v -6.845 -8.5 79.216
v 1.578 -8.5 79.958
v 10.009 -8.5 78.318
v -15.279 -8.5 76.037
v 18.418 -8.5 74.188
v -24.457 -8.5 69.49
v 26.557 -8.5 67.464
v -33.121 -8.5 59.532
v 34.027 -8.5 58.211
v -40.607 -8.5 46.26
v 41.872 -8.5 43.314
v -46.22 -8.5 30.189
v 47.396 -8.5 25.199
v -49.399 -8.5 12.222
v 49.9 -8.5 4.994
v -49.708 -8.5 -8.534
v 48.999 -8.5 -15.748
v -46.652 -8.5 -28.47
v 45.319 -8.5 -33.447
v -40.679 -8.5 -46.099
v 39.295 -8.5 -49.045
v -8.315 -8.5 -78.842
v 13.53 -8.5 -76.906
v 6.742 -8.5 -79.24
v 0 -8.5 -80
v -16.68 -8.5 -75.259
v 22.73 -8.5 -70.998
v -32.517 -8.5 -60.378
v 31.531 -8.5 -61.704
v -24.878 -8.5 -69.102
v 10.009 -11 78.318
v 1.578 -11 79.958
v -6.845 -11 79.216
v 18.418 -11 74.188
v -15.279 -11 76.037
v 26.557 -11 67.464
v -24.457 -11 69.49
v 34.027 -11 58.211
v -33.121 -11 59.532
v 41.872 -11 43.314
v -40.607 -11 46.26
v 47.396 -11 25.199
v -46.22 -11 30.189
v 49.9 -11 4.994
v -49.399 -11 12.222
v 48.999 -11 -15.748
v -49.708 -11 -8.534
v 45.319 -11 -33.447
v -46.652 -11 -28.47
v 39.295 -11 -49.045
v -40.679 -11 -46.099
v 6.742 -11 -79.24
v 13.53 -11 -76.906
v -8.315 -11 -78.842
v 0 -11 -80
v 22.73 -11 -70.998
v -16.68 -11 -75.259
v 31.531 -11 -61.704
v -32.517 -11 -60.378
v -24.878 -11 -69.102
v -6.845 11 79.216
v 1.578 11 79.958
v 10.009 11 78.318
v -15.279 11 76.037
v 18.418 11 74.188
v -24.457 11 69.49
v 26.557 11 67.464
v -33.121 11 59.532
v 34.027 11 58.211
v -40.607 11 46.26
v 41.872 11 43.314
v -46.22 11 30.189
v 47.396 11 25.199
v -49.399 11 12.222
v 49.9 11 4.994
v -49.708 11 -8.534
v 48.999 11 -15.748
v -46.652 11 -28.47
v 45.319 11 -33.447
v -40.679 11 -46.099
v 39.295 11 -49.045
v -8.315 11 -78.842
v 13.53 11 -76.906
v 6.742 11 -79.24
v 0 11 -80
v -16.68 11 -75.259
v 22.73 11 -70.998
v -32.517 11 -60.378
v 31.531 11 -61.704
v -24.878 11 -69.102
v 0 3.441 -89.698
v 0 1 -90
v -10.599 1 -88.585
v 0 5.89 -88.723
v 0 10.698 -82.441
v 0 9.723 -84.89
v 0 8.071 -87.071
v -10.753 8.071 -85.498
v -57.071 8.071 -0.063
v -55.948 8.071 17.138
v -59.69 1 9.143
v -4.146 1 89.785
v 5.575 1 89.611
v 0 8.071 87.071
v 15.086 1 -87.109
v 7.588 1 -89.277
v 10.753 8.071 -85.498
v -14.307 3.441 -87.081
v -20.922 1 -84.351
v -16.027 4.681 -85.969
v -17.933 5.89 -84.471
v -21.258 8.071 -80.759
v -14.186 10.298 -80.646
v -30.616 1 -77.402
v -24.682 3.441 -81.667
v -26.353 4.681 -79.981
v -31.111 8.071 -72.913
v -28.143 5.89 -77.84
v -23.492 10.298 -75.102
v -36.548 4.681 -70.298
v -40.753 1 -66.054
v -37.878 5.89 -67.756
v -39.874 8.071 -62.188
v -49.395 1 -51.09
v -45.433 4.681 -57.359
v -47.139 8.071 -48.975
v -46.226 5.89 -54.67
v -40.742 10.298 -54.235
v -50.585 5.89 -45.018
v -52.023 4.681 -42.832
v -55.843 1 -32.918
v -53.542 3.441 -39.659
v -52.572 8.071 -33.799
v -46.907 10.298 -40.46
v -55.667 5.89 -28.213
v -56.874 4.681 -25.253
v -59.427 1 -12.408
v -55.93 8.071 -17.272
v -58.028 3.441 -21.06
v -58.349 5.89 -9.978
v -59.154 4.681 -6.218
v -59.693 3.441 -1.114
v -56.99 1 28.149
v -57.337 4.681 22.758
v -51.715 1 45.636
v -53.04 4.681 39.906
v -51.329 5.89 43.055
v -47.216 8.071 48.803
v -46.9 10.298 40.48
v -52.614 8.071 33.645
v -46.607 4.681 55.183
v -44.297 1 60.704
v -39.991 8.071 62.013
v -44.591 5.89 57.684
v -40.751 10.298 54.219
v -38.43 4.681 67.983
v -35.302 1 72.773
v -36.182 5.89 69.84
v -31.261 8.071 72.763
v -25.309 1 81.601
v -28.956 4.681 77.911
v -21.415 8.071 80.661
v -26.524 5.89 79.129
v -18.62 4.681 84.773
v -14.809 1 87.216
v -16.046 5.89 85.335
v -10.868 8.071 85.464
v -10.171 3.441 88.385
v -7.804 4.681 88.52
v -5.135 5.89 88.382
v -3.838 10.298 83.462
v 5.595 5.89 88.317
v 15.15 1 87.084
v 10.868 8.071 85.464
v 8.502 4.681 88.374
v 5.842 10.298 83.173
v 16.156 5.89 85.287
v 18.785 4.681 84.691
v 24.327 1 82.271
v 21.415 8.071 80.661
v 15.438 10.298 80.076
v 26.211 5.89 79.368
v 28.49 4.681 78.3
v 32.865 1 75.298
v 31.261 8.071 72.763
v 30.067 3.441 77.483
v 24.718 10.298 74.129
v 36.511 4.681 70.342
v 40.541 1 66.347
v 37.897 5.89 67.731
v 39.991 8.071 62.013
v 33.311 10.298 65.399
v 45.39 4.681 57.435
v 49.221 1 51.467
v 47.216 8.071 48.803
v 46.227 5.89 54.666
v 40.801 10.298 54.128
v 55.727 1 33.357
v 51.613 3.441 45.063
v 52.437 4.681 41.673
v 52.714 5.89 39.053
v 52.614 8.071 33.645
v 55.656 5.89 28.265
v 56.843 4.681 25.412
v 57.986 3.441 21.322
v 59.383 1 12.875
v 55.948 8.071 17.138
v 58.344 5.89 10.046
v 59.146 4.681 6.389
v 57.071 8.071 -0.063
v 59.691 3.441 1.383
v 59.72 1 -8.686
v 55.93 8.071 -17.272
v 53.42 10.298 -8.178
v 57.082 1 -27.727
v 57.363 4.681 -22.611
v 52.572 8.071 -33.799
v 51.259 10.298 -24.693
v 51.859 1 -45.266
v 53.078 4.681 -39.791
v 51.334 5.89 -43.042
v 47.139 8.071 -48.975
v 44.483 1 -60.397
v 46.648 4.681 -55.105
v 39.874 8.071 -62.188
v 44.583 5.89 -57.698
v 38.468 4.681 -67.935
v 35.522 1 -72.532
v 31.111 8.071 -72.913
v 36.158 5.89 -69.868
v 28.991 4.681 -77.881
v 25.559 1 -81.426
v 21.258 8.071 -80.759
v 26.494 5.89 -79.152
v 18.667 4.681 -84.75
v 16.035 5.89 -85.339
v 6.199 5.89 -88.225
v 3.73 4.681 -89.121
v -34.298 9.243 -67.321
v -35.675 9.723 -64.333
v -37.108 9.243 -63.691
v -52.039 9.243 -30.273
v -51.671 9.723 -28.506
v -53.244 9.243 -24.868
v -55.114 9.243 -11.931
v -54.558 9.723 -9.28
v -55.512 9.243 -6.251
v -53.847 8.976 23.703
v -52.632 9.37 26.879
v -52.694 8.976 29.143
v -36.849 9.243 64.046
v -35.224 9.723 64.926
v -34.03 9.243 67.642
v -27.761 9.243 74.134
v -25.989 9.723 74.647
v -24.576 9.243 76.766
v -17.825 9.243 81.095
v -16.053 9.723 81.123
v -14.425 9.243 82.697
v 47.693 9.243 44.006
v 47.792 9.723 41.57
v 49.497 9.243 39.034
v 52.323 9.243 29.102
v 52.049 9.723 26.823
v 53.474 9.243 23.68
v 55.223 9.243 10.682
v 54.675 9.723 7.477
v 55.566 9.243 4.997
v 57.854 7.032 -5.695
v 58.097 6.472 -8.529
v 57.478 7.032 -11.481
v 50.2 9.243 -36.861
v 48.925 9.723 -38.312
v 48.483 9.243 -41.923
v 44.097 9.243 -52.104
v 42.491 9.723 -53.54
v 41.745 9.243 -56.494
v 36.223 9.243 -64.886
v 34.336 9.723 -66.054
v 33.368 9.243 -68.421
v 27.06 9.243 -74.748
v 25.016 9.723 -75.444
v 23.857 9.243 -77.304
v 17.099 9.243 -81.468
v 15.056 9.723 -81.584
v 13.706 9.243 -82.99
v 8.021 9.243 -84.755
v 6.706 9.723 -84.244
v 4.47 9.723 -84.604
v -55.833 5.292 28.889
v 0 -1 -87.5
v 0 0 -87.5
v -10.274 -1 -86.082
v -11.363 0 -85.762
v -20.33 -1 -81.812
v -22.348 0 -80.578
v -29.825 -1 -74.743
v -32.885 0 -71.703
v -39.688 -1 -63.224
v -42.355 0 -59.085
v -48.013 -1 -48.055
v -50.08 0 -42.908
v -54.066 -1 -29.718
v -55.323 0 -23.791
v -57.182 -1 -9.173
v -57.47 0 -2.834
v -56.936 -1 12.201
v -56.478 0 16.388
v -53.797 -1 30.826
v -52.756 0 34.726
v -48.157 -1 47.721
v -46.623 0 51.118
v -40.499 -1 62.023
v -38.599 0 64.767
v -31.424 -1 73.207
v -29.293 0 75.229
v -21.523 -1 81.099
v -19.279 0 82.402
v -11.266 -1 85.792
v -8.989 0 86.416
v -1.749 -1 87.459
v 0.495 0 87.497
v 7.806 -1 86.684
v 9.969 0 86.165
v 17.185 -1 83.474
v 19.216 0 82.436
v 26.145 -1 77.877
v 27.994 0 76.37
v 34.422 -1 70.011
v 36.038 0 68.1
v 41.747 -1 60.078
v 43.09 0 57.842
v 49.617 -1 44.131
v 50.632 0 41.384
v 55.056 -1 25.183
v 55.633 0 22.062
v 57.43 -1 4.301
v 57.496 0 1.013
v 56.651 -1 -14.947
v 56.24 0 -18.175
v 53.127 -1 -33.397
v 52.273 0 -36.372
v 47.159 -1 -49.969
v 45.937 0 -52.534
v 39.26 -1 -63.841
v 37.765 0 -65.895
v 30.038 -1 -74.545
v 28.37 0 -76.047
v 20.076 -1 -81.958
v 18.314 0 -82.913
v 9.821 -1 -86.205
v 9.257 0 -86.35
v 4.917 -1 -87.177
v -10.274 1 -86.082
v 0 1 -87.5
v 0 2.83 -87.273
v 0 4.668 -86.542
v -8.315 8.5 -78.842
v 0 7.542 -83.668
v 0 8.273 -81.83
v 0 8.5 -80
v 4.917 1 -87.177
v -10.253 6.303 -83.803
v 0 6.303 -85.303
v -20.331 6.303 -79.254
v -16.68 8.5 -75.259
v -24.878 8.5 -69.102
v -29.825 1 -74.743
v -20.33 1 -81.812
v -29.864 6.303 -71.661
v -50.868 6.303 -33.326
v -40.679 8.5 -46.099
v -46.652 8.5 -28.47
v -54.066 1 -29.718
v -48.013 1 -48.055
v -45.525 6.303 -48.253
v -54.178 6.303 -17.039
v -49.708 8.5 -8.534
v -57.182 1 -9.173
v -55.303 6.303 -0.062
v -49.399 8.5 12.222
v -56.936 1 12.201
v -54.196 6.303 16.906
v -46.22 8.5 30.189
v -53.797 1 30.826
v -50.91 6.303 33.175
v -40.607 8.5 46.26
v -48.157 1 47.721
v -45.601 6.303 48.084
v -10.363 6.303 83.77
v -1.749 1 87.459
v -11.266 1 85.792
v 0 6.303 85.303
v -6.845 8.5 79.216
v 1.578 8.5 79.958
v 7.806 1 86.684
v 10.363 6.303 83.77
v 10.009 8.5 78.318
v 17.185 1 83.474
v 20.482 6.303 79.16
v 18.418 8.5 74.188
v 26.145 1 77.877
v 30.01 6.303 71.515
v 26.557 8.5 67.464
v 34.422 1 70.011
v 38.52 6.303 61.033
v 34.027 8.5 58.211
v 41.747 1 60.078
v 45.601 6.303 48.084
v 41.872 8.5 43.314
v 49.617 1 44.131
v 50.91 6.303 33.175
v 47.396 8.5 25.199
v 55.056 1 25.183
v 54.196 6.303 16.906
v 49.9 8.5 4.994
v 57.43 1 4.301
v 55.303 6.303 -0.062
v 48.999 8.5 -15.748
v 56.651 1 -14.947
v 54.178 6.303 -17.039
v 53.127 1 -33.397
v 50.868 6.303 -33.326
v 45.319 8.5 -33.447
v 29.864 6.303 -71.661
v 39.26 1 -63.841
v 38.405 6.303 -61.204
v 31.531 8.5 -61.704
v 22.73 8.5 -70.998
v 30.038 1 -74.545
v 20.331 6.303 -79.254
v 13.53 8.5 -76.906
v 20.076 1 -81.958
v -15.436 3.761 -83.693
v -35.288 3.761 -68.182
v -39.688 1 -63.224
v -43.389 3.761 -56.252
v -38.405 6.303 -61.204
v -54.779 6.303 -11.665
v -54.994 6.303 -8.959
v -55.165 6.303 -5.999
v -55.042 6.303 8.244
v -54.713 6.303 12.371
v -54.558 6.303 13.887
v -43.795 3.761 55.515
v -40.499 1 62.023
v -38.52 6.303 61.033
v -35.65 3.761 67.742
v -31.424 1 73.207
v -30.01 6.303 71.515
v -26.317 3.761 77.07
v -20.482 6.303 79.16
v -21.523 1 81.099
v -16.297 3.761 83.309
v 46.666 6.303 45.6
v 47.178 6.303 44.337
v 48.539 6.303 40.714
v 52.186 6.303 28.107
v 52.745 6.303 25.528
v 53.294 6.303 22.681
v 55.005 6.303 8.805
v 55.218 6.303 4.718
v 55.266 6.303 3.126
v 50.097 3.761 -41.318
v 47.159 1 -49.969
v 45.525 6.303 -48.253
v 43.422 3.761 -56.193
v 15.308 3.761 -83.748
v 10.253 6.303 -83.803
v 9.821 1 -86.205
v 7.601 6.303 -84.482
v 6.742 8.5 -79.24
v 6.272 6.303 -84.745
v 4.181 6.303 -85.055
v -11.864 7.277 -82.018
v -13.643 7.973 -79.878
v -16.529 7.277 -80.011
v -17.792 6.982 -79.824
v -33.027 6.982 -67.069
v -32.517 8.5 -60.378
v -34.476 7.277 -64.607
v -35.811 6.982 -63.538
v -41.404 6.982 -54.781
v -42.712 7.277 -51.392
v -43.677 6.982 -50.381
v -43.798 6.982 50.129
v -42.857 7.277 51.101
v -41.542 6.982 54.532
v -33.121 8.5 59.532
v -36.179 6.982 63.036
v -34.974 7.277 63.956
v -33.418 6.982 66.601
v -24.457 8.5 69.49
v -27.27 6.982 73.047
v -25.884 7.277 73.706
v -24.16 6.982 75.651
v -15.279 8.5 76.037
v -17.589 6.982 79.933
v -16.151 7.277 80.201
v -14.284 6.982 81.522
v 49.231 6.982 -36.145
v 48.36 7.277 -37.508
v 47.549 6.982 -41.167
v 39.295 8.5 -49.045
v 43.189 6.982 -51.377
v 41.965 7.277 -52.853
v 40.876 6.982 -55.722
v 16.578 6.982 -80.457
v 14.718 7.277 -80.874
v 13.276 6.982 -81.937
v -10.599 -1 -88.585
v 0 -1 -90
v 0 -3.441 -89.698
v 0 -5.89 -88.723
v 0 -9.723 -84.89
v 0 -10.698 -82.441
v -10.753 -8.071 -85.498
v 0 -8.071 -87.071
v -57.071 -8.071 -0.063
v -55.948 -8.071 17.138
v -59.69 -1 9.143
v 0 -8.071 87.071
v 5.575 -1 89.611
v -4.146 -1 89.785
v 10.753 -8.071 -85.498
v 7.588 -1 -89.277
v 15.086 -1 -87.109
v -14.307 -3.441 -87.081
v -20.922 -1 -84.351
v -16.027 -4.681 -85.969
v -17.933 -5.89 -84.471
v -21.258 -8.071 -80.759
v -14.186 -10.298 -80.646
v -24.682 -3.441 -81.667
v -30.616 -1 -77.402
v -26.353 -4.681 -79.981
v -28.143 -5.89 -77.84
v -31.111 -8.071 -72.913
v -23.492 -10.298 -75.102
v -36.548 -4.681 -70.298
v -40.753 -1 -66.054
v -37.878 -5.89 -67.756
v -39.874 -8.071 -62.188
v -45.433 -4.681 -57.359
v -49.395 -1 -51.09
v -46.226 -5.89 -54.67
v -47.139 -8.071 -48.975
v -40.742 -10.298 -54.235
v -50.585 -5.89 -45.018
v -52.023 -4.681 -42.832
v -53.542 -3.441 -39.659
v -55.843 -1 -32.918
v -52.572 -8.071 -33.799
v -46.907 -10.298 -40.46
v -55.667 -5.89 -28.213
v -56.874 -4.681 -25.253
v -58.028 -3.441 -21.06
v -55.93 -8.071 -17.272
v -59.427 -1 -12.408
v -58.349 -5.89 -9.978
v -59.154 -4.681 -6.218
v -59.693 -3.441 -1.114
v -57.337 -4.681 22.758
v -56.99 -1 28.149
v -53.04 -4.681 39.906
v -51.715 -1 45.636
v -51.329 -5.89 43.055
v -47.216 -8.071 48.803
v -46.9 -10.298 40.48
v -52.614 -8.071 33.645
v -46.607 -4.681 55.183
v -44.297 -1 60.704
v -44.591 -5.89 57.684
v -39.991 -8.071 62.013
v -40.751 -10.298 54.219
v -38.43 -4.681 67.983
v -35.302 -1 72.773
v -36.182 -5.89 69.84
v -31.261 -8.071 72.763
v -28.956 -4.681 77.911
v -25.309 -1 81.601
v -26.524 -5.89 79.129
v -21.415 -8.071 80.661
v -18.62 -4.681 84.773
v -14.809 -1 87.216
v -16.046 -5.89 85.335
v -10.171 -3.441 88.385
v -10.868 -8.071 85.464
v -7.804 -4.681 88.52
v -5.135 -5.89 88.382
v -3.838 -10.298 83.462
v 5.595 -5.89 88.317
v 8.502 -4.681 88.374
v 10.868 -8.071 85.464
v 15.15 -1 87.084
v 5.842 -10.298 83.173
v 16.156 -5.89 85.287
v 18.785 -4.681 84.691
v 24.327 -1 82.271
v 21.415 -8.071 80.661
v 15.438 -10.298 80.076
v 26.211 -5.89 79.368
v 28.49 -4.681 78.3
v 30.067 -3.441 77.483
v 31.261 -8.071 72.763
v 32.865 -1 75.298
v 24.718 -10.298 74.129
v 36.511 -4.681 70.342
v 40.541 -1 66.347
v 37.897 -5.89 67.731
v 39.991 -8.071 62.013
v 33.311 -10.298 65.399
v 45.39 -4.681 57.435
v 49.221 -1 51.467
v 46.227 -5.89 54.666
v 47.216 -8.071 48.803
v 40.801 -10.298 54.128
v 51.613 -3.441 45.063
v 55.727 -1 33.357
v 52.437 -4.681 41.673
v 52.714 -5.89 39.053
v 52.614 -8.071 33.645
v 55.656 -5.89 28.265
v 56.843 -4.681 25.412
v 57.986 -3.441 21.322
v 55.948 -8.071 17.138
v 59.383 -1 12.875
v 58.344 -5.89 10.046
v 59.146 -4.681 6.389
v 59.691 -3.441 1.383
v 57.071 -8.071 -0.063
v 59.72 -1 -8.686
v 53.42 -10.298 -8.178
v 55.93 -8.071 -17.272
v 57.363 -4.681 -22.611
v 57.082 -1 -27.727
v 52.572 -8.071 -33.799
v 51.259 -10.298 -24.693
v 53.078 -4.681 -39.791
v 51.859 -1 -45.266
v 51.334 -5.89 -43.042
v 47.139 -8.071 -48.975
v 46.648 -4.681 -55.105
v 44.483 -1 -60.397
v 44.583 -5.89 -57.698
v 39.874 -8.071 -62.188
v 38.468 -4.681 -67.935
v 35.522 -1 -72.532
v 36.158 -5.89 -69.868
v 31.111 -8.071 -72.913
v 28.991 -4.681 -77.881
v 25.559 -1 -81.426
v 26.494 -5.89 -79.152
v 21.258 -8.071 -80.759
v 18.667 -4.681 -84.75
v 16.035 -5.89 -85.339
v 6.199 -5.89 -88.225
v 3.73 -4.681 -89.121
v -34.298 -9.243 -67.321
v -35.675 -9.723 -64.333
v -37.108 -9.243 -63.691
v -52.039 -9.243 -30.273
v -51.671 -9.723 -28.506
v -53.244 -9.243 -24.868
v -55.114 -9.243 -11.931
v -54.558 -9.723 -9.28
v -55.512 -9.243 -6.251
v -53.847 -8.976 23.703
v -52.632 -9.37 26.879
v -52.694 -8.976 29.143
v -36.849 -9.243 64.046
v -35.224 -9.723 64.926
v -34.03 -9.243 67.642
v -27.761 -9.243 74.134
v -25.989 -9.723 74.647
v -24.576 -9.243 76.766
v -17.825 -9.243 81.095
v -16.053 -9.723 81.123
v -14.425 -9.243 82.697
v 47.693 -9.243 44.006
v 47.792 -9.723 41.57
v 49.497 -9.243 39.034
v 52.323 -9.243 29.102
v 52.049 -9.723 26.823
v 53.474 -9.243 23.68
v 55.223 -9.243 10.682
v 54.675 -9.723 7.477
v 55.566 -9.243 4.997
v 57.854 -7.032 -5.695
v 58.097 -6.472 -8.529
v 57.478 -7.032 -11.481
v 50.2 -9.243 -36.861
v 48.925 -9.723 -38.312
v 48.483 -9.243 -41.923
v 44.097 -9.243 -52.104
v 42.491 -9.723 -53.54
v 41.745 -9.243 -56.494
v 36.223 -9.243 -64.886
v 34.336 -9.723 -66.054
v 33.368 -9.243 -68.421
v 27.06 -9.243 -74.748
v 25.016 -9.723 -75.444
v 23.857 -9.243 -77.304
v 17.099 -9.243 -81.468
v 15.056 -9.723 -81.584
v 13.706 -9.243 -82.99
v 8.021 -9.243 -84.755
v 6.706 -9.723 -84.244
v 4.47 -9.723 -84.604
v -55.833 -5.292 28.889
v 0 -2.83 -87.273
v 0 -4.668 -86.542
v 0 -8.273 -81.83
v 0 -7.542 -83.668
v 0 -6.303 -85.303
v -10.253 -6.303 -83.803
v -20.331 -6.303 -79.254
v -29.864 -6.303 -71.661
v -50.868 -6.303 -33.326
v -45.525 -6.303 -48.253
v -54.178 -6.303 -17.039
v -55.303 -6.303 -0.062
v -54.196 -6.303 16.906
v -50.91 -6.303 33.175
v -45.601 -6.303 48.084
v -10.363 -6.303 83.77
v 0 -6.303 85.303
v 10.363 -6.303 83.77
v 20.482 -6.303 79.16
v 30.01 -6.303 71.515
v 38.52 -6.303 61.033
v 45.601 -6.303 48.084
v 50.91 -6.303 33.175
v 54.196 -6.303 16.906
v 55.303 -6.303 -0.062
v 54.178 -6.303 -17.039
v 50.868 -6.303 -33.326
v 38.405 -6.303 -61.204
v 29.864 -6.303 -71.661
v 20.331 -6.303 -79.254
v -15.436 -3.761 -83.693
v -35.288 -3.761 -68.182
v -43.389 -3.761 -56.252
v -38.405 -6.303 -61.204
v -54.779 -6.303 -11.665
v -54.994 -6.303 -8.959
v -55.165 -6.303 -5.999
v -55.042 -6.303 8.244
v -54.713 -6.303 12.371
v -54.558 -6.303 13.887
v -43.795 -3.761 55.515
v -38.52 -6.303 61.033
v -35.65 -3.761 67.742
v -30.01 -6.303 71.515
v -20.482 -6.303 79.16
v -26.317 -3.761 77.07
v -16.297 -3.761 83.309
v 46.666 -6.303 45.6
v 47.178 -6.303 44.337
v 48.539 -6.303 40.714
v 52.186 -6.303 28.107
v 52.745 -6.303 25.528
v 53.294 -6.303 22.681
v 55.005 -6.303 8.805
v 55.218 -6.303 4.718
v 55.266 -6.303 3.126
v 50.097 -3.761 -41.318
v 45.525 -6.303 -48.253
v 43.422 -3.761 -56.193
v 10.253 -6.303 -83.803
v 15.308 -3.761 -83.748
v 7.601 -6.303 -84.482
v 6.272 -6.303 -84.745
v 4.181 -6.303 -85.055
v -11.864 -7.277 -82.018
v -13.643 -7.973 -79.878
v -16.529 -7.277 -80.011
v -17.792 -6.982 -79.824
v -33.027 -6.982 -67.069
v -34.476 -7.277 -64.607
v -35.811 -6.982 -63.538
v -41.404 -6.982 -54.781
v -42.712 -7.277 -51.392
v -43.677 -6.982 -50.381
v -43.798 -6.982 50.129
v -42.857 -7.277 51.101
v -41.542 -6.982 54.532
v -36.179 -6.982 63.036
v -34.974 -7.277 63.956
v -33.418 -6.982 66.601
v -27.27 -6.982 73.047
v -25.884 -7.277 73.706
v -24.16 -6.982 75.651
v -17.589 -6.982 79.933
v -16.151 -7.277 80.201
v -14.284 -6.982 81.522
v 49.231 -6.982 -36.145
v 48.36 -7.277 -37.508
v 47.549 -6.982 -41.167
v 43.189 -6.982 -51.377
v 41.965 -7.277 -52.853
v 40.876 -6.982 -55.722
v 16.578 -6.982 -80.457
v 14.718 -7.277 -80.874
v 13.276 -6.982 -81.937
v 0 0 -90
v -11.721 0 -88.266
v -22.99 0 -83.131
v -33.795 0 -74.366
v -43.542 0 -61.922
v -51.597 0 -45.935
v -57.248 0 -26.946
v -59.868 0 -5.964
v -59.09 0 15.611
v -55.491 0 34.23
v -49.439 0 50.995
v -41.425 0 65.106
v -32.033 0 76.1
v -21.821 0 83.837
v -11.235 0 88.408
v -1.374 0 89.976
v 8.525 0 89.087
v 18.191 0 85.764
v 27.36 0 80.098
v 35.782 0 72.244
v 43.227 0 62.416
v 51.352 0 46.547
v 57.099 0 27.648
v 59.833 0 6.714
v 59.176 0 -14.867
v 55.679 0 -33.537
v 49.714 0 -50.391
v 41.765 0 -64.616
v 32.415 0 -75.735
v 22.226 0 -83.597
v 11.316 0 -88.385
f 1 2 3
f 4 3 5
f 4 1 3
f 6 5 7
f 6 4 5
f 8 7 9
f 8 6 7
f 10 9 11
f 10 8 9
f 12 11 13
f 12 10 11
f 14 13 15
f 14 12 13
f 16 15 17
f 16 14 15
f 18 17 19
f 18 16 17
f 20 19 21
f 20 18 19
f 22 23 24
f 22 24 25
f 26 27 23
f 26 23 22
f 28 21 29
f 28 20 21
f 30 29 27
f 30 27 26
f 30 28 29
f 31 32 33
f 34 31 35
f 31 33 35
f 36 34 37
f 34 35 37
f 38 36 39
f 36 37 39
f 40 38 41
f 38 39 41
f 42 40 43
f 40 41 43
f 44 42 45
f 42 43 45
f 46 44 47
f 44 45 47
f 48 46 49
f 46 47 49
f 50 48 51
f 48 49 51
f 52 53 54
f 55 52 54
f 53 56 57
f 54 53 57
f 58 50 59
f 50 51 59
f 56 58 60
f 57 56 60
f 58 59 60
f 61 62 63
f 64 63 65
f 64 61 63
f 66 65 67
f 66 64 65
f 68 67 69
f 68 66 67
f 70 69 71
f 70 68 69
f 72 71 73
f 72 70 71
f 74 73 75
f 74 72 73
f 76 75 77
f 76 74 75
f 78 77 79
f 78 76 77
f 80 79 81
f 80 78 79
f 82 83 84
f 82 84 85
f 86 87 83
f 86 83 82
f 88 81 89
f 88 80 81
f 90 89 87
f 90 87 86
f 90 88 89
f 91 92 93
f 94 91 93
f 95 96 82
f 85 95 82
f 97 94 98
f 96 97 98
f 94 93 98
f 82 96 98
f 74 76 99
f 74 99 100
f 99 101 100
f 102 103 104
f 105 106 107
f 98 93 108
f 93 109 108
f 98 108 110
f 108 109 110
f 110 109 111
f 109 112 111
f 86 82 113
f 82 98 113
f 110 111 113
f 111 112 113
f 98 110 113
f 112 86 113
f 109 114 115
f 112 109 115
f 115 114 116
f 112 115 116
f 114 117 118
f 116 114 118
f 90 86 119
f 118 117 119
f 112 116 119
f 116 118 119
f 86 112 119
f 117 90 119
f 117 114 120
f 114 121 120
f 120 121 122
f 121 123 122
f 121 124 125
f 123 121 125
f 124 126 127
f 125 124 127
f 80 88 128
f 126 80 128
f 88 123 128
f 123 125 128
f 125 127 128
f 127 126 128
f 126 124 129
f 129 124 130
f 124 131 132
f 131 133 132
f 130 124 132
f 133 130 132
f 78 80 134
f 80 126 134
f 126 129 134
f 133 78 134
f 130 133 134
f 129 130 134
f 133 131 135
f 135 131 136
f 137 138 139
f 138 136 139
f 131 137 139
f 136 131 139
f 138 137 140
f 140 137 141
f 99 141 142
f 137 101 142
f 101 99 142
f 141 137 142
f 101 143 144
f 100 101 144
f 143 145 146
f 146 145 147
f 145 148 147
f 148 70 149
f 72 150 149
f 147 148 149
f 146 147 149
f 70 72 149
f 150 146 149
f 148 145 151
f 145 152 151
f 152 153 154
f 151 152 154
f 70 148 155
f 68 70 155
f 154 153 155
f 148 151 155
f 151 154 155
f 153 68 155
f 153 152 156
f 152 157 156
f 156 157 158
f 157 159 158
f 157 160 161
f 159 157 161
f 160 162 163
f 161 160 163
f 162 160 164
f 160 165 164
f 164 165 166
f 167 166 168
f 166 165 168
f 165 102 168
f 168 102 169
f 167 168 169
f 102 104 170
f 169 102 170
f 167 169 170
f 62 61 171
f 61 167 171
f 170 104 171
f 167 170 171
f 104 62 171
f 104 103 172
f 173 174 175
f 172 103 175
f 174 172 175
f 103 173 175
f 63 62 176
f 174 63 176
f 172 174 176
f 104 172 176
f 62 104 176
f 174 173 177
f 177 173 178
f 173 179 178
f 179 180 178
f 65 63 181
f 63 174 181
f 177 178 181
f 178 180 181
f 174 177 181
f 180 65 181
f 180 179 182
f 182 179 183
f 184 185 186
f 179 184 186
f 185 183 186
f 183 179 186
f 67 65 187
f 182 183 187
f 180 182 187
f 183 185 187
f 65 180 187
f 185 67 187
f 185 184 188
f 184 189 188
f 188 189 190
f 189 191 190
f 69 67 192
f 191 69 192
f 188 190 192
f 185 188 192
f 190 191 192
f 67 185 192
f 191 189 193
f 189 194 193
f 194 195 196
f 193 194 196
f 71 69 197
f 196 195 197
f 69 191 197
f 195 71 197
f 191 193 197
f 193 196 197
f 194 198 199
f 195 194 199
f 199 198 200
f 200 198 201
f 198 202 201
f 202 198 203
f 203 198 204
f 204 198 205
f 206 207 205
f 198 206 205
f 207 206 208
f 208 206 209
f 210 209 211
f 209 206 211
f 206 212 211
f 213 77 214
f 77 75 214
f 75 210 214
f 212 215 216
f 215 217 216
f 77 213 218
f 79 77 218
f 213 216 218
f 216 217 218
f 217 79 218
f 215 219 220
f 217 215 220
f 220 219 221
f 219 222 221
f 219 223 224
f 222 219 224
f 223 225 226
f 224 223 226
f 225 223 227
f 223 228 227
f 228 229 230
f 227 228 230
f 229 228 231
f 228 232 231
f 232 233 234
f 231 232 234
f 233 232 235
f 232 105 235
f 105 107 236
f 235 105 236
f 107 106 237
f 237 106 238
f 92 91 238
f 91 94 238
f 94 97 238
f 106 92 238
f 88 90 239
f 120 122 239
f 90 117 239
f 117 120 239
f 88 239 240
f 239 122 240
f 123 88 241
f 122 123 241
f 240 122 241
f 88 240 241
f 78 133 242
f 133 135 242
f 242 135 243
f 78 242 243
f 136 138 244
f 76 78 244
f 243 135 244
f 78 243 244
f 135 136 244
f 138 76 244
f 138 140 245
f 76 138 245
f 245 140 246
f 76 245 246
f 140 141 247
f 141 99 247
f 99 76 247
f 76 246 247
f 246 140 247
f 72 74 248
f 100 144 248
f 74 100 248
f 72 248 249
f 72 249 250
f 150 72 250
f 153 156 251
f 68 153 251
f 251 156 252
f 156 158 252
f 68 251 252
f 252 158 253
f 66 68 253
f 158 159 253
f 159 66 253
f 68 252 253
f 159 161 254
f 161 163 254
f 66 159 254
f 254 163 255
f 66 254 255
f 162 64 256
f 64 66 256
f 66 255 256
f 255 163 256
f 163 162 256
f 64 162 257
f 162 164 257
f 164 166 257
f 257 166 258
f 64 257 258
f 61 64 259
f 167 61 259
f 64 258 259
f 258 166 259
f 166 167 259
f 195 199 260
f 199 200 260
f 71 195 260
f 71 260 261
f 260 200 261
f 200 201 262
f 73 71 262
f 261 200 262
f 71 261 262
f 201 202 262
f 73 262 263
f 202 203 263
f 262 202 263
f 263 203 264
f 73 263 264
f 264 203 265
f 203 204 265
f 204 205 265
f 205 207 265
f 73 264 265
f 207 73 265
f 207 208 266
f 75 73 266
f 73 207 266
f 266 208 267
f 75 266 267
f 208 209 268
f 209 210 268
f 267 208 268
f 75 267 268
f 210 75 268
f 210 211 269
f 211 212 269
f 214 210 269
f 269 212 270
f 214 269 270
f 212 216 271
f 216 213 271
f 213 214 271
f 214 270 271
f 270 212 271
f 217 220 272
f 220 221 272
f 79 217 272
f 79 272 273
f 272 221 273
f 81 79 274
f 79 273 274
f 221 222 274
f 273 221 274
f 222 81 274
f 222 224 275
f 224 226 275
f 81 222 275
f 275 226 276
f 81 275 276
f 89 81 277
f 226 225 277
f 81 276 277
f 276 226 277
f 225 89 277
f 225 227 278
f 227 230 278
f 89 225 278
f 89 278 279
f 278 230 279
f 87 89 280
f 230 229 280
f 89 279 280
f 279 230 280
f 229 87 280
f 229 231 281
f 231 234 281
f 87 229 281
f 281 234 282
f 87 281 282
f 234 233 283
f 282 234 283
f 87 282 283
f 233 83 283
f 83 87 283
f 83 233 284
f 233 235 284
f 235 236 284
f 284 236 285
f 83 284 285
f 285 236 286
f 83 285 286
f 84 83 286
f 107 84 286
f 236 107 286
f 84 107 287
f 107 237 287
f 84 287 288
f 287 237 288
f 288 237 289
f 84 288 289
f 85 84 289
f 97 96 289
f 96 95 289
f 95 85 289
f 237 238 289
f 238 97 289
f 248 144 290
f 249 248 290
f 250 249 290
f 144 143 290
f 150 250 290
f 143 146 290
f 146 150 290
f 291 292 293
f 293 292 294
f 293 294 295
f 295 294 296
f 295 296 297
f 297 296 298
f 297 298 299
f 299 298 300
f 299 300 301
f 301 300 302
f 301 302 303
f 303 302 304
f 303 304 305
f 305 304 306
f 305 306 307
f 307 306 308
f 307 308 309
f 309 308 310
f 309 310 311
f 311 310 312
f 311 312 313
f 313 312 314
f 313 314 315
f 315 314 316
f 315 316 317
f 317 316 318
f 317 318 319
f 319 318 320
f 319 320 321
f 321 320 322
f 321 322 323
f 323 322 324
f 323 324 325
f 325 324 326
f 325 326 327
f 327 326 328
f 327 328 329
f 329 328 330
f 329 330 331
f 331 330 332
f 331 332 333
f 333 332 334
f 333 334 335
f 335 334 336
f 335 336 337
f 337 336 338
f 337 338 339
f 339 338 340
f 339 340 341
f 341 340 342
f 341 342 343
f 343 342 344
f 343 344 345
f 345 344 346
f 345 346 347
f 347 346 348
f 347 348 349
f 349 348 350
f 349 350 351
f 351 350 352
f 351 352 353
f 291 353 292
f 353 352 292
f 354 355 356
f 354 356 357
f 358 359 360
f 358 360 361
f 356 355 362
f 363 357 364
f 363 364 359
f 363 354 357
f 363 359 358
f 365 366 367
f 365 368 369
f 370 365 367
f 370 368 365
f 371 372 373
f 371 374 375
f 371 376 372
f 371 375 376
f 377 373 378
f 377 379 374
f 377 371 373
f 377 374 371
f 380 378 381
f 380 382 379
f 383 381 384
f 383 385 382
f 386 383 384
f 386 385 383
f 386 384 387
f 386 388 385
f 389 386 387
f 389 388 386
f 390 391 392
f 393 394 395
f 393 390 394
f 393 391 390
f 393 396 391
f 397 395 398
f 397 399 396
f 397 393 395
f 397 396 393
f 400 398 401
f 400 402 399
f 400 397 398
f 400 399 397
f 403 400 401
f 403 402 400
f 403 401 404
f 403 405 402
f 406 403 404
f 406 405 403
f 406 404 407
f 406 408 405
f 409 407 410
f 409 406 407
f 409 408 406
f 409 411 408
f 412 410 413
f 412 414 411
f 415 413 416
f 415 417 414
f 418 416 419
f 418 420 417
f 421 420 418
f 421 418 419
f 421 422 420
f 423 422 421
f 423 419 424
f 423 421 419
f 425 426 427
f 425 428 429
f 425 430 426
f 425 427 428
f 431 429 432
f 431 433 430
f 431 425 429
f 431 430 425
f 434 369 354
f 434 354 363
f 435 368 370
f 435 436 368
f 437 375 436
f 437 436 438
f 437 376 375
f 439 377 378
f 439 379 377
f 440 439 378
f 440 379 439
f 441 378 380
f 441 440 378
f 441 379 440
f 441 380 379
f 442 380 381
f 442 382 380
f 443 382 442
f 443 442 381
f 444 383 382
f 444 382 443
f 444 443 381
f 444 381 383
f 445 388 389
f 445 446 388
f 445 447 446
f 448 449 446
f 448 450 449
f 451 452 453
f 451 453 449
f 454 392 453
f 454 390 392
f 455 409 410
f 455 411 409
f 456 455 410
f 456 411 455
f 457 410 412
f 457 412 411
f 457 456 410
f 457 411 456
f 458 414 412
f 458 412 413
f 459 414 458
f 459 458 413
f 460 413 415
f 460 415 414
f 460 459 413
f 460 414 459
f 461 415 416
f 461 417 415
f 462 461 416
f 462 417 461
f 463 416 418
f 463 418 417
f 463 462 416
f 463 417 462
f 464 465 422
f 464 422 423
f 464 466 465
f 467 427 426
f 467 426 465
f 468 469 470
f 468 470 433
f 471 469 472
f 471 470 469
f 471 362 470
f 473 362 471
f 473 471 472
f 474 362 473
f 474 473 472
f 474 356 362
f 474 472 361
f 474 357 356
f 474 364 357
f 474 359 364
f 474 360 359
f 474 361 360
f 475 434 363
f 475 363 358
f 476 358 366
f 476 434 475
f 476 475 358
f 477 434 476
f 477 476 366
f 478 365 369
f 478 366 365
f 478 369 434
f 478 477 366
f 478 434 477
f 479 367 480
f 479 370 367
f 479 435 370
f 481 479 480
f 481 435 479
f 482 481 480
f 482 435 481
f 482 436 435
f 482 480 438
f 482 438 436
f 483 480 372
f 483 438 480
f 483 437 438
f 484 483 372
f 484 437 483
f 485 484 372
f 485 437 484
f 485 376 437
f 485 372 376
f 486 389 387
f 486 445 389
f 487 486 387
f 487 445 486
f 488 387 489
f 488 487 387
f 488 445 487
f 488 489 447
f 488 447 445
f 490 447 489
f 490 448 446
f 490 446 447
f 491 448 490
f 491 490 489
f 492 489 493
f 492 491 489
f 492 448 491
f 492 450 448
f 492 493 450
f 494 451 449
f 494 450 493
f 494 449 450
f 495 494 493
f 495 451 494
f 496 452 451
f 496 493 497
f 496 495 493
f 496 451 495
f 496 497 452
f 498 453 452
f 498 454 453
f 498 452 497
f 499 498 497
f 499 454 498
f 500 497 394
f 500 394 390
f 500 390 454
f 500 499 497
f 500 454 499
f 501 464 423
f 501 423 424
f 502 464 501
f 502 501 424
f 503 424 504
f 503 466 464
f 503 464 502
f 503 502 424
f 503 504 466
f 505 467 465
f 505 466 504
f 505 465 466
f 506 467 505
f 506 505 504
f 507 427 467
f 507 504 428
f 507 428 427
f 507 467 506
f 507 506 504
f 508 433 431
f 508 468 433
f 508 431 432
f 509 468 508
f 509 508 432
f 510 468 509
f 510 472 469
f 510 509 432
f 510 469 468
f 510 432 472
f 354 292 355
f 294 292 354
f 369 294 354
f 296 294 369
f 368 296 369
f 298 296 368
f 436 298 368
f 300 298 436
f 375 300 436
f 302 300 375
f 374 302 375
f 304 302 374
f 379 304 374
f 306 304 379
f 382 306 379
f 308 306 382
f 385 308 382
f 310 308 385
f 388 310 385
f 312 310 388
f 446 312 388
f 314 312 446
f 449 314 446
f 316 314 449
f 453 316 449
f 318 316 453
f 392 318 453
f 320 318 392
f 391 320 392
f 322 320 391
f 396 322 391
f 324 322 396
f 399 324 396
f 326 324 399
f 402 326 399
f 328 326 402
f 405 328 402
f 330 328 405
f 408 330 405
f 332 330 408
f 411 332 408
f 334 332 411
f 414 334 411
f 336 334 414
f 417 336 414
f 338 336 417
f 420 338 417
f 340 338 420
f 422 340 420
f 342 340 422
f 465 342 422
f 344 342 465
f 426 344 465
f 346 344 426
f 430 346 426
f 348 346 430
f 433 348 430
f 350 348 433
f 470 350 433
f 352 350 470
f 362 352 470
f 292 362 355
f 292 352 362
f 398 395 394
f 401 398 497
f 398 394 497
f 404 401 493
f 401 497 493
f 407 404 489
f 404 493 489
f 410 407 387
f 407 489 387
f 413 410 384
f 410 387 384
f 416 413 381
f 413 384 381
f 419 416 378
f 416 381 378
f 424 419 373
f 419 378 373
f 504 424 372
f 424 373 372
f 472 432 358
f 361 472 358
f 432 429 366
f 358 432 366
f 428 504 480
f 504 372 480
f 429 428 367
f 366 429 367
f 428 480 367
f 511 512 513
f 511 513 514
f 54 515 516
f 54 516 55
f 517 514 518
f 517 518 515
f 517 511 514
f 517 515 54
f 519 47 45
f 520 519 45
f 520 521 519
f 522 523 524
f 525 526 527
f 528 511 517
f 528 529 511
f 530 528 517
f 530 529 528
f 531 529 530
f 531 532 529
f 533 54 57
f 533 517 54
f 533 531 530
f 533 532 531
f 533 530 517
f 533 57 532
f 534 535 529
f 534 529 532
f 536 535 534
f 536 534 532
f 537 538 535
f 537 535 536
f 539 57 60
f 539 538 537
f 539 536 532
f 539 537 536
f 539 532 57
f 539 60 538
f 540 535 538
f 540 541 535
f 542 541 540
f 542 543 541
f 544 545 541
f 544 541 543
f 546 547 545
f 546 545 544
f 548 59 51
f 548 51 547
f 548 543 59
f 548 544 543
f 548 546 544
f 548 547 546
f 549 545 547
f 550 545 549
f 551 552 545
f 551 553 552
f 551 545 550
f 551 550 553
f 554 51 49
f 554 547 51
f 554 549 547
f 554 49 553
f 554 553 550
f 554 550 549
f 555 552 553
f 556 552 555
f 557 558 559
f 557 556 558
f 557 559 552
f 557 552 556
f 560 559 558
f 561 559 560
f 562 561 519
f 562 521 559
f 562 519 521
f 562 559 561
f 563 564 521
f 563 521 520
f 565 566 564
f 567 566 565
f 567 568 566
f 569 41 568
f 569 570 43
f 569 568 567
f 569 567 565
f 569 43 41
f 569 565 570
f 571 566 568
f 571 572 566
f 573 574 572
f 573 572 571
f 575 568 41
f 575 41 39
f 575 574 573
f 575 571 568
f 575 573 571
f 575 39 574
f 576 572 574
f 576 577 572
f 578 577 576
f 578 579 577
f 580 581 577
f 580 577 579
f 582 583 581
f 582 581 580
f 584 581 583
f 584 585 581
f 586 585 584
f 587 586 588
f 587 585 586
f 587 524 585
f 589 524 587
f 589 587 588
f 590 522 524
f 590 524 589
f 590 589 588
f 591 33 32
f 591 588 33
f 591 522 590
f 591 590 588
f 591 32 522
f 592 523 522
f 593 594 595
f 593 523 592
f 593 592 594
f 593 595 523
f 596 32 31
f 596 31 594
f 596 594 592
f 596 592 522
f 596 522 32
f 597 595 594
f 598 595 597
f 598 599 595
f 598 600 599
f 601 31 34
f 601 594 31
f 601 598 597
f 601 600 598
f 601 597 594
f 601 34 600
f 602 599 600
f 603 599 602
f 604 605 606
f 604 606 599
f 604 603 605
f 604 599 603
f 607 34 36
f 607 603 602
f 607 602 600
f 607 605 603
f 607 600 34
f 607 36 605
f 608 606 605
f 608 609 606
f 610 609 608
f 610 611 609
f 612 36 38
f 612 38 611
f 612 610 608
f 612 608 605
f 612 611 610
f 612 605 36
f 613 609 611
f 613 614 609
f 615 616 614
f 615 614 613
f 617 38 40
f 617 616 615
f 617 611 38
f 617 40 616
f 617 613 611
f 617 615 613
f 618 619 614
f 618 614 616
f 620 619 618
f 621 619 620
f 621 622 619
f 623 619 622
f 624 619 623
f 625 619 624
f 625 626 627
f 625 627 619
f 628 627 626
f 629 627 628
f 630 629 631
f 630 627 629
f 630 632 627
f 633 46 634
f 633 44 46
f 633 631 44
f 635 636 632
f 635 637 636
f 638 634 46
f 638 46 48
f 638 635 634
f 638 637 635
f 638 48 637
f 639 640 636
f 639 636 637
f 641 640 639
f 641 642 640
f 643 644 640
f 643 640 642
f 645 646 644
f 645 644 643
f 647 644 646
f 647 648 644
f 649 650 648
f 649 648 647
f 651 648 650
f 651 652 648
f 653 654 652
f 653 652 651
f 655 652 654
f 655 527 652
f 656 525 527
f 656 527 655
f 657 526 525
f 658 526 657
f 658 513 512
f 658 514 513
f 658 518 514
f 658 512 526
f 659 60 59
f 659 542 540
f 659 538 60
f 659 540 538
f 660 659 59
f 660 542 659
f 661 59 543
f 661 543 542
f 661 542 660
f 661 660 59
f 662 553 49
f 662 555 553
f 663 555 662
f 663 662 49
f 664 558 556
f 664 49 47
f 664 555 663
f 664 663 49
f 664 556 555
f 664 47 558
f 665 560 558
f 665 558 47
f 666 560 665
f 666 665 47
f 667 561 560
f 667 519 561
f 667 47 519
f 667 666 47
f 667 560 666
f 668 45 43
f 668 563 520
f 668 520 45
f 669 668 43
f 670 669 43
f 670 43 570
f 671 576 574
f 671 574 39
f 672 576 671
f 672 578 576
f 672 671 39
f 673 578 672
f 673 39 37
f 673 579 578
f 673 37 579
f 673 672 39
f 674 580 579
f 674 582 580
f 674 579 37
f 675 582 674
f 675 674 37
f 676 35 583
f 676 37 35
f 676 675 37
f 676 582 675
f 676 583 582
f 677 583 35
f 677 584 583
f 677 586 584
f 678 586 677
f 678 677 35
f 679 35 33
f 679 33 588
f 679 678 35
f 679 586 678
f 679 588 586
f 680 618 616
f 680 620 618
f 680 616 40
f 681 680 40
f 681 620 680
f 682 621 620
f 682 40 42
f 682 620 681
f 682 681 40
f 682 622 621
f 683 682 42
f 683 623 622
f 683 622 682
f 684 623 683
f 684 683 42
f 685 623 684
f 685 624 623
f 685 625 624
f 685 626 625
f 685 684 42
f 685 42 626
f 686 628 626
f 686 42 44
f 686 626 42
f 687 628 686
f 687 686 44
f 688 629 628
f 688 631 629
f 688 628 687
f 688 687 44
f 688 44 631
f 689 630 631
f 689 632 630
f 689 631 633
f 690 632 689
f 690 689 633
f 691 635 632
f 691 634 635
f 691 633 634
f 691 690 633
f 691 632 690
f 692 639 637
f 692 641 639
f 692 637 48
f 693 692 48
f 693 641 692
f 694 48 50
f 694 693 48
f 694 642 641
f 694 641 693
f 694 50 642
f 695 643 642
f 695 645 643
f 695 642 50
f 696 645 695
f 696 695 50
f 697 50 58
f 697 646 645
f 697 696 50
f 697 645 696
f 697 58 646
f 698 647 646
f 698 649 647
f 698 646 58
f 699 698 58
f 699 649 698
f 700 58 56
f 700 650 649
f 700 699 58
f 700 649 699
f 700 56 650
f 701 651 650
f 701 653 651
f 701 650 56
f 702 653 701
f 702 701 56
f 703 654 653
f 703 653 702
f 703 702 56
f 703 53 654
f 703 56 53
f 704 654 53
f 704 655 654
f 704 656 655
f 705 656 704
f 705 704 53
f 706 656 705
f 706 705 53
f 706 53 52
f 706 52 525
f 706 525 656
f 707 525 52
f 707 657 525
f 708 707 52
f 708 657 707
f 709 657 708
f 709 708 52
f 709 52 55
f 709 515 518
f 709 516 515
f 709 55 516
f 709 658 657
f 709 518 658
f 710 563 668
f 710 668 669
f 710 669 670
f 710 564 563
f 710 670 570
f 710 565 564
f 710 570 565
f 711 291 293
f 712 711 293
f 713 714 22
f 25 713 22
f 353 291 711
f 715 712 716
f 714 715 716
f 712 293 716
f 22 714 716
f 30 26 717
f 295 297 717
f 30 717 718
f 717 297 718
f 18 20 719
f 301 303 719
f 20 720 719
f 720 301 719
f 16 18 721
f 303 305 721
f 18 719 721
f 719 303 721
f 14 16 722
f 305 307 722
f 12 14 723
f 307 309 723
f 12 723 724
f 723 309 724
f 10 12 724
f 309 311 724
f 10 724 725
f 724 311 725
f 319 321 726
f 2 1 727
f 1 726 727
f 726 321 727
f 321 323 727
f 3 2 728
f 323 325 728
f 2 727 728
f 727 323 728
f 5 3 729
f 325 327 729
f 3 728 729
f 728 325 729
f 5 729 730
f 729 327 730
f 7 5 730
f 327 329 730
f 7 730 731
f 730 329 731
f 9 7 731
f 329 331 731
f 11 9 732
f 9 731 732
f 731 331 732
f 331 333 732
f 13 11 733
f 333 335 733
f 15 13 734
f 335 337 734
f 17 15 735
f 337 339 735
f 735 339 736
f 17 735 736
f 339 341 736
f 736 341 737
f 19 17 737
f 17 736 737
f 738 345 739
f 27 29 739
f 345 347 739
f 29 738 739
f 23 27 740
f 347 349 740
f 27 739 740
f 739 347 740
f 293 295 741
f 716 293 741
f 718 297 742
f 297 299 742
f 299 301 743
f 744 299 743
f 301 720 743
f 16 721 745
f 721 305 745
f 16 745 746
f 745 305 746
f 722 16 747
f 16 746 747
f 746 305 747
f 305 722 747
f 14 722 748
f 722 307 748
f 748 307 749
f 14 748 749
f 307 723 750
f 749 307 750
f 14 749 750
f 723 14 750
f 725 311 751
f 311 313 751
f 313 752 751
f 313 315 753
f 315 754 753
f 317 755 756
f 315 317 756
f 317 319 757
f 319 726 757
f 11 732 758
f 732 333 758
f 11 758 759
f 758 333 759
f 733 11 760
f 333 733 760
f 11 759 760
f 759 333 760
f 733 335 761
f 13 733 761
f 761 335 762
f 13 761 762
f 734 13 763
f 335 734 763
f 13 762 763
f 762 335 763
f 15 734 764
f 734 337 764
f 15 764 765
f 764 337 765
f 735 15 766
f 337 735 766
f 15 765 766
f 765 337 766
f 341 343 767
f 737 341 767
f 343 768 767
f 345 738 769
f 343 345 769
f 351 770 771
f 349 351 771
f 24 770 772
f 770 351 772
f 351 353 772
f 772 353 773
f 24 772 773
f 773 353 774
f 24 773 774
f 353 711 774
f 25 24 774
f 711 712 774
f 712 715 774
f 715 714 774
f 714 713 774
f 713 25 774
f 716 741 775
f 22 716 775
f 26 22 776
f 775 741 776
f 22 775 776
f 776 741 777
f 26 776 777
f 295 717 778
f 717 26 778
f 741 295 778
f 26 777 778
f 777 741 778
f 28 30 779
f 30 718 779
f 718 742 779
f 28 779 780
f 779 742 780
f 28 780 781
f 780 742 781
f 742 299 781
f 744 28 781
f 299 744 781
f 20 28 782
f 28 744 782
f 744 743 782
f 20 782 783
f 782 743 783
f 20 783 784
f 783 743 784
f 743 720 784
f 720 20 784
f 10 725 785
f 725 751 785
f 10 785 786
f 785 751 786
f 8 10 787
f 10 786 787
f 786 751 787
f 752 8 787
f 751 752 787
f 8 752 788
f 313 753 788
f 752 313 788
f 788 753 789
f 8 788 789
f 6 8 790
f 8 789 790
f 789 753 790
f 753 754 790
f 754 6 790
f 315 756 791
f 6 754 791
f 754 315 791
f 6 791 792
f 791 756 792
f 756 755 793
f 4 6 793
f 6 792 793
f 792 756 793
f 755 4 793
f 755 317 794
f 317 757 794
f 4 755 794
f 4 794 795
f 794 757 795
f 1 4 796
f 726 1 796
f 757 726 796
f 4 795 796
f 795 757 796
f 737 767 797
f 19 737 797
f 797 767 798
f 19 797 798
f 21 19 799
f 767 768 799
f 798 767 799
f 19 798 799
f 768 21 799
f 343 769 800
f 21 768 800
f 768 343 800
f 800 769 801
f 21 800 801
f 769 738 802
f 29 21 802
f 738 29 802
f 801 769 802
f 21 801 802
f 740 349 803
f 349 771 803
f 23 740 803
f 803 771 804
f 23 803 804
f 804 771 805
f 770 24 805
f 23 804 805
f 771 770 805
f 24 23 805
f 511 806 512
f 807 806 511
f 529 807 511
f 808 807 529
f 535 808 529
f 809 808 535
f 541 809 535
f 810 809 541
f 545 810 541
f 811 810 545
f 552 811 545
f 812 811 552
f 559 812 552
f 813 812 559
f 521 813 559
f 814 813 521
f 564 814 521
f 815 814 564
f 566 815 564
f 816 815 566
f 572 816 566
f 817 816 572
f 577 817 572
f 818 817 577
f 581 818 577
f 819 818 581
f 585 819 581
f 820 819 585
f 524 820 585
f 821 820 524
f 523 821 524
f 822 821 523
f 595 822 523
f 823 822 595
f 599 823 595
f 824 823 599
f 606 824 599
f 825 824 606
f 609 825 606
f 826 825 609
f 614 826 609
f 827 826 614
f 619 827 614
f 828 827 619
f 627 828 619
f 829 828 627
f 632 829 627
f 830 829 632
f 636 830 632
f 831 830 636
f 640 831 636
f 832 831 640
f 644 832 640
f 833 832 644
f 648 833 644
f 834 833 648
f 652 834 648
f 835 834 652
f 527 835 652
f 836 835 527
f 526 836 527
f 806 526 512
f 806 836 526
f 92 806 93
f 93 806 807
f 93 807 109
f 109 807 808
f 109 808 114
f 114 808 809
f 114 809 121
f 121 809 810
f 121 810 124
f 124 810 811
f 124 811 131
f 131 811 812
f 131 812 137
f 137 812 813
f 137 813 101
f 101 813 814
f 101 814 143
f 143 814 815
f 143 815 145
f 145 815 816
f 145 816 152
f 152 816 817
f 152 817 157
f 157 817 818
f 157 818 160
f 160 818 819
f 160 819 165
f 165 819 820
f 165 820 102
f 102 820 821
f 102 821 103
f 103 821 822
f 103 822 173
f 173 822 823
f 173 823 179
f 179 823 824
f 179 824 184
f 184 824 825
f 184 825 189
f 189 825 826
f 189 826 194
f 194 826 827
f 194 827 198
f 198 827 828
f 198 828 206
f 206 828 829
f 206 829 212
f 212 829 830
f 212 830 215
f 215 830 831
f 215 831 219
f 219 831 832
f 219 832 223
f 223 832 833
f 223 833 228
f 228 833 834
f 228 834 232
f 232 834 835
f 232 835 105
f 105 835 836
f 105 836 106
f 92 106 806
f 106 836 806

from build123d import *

# Parameters (mm, degrees)
SKETCH1_RX          = 90
SKETCH1_RY          = 60
BOSS_EXTRUDE3_DEPTH = 11
FILLET1_R           = 10
SHELL4_T            = 2.5


with BuildPart() as part:
    # Sketch1 → Boss-Extrude3 (new, symmetric)
    with BuildSketch(Plane(origin=(0, 0, 0), x_dir=(1, 0, 0), z_dir=(0, 1, 0))):
        with Locations(Location((0, 0), (0, 0, 90))):
            Ellipse(SKETCH1_RX, SKETCH1_RY)
    extrude(amount=BOSS_EXTRUDE3_DEPTH, both=True)

    # Fillet1
    fillet1_edges = [part.edges().sort_by_distance(p)[0] for p in [
        (0.063886799, -11, 89.999948981),
        (0.063886799, 11, 89.999948981),
    ]]
    fillet(fillet1_edges, radius=FILLET1_R)

    # Shell4 (no face opened: a closed hollow body)
    add(offset(amount=-SHELL4_T, mode=Mode.PRIVATE), mode=Mode.SUBTRACT)


solid = part.part
